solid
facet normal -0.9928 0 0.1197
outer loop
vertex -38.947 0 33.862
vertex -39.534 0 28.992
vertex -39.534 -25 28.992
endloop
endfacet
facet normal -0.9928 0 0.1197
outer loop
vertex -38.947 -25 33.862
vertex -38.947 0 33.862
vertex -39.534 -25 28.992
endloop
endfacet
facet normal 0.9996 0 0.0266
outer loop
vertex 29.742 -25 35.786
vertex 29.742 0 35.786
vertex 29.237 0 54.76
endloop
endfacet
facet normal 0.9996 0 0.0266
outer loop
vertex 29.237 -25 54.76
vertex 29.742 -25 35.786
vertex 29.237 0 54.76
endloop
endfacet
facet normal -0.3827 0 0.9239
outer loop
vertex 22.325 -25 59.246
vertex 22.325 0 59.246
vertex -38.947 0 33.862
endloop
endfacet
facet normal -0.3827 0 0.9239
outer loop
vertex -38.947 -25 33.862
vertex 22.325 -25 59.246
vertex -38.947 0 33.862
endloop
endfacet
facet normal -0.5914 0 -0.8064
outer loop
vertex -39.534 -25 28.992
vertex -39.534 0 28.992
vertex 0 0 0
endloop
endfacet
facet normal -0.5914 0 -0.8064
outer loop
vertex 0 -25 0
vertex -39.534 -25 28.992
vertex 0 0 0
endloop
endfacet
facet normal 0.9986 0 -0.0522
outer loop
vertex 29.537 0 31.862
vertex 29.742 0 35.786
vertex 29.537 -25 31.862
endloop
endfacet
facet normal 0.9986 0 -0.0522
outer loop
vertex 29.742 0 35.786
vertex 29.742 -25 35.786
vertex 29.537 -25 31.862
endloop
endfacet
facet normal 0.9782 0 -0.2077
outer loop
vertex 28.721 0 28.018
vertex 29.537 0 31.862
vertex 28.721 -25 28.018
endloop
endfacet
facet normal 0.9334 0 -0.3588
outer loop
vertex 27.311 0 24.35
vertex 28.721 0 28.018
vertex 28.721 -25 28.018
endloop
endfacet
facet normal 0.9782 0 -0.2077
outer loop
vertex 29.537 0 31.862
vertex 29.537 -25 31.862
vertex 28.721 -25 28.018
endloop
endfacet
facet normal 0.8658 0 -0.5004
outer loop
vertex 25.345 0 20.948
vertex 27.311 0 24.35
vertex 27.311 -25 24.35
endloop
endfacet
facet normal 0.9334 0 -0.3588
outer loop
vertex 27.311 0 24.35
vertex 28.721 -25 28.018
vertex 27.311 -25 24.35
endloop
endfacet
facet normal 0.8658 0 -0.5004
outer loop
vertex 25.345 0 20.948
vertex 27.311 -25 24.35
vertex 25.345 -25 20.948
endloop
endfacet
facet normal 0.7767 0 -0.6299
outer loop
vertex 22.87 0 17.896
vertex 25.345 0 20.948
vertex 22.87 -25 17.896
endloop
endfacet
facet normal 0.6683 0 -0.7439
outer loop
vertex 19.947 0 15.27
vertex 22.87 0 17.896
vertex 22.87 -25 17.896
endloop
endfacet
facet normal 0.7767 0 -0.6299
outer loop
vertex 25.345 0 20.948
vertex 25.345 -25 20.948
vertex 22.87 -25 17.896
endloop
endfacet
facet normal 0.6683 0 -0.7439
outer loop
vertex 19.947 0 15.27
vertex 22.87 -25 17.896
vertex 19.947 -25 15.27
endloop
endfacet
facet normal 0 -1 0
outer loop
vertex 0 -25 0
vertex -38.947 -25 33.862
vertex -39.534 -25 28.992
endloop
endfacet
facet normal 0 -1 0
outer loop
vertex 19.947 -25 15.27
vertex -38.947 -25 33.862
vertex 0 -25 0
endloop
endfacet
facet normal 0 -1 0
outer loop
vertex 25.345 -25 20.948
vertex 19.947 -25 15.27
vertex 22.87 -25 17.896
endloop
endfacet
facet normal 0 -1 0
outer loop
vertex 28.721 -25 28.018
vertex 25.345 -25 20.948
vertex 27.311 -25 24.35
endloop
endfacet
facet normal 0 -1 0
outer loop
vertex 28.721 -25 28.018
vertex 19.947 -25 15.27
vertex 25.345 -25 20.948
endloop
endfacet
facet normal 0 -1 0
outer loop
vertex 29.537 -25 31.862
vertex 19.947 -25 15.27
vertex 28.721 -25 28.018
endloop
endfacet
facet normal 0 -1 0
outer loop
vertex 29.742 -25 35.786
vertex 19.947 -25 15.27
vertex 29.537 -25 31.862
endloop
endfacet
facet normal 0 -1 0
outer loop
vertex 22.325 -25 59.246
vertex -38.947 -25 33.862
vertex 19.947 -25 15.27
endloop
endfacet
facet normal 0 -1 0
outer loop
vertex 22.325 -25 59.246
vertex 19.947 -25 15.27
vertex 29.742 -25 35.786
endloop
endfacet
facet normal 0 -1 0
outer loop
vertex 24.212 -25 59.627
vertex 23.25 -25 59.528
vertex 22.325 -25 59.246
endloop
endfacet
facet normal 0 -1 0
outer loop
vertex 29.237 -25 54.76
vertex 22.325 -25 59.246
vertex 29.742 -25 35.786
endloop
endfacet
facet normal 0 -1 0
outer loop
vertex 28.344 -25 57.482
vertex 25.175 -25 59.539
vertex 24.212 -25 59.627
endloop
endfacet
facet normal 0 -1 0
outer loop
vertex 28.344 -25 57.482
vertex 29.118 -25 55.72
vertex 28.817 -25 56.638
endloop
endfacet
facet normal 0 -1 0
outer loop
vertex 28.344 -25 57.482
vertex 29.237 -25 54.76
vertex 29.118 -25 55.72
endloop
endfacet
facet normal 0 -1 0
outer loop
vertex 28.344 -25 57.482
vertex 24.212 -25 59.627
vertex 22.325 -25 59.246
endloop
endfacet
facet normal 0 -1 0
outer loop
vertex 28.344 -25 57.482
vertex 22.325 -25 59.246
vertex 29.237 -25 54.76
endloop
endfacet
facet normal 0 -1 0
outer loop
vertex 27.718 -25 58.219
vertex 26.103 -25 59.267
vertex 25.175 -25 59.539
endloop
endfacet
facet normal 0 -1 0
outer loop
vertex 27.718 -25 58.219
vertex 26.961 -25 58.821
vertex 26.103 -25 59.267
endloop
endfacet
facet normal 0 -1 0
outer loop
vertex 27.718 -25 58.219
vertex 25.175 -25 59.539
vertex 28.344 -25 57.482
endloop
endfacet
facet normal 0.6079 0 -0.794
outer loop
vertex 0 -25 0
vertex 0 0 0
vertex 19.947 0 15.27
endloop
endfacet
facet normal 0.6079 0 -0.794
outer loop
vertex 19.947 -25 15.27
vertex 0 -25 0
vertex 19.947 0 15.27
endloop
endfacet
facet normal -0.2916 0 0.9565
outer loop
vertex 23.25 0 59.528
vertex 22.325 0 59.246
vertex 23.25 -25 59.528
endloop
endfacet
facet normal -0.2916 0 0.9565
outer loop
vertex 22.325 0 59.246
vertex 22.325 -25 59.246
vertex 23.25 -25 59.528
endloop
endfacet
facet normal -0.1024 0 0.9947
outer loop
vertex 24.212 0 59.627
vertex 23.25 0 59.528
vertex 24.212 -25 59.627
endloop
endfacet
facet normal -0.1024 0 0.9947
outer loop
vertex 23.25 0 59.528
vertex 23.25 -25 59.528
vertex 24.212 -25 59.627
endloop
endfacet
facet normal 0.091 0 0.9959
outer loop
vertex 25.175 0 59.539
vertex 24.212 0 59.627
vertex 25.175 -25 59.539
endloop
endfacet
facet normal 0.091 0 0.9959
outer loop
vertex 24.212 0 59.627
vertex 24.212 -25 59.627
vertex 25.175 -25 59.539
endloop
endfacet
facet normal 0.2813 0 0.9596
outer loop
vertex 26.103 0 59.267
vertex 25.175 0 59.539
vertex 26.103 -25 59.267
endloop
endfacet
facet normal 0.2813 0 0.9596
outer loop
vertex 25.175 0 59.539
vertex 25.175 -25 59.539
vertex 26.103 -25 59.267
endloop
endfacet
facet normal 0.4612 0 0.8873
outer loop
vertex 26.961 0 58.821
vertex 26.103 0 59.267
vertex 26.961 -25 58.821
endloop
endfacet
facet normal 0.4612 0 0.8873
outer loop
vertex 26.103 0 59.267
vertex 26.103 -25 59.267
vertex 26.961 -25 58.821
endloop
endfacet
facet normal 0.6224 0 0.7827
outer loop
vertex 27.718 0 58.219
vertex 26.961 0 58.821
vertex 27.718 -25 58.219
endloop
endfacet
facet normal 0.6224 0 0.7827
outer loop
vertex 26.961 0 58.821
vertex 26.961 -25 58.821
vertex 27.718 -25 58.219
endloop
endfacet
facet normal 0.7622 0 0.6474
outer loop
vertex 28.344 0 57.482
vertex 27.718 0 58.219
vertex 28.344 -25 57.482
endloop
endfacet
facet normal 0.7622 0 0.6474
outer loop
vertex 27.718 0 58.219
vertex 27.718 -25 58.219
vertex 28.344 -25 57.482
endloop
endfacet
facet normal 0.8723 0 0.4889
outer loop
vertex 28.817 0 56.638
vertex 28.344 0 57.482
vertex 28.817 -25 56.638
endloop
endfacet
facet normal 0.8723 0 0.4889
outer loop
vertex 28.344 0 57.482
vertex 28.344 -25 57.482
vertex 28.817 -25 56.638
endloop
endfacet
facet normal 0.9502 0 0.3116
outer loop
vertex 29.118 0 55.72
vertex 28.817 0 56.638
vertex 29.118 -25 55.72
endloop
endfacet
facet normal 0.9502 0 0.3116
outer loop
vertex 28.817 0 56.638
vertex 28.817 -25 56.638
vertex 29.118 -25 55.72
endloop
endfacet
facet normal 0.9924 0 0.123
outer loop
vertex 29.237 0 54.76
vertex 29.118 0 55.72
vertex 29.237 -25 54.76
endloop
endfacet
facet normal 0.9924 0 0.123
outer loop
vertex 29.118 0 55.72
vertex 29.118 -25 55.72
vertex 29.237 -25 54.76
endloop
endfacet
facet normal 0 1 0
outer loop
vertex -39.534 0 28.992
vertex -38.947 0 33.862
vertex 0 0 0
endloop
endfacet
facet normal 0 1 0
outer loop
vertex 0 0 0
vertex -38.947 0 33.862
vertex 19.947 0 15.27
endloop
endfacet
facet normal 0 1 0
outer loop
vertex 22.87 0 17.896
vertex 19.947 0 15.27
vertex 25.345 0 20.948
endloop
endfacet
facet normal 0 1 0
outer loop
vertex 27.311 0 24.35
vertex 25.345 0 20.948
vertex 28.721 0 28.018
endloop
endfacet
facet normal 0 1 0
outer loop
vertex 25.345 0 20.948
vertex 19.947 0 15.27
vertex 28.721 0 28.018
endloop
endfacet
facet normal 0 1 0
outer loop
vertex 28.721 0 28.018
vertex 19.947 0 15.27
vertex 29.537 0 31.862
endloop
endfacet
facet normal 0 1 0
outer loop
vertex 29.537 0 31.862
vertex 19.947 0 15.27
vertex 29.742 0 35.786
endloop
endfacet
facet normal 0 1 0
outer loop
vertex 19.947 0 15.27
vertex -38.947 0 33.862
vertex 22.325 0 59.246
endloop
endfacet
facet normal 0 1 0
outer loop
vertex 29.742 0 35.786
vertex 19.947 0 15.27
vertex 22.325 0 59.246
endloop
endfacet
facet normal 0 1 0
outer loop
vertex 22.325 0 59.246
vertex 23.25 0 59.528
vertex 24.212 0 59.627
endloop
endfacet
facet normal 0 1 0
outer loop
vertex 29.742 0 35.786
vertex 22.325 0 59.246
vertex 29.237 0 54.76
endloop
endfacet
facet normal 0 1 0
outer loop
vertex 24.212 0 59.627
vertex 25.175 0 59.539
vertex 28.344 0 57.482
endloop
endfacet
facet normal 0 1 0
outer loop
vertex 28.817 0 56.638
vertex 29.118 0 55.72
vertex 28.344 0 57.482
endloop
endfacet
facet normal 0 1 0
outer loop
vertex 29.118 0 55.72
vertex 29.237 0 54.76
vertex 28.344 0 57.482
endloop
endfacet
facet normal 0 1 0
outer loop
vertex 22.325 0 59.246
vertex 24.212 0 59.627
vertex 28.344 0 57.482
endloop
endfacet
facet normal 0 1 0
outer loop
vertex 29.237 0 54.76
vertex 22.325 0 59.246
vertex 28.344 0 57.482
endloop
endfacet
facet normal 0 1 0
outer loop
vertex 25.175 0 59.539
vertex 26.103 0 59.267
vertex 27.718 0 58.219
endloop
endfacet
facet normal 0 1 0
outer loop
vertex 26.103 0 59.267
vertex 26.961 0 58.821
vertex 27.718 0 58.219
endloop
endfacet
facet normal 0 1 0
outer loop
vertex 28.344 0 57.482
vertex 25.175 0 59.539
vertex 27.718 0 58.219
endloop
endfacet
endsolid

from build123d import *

# Parameters (mm, degrees)
F1_DEPTH = 25
F2_SIZE  = 5
F3_R     = 5
F4_R     = 25
F5_R     = 7.049752
F6_DEPTH = 25


with BuildPart() as f1:
    # F0 (on Front) → F1 (new body)
    with BuildSketch(Plane.XZ):
        Polygon((0, 0), (30.081257, 23.027755), (29.043972, 62.029697), (-43.566033, 31.94841), align=None)
    extrude(amount=F1_DEPTH)

    # F2
    f2_edges = [f1.edges().sort_by_distance(p)[0] for p in [
        (-43.566033, -12.5, 31.94841),
    ]]
    chamfer(f2_edges, length=F2_SIZE)

    # F3
    f3_edges = [f1.edges().sort_by_distance(p)[0] for p in [
        (29.043972, -12.5, 62.029697),
    ]]
    fillet(f3_edges, radius=F3_R)

    # F4
    f4_edges = [f1.edges().sort_by_distance(p)[0] for p in [
        (30.081257, -12.5, 23.027755),
    ]]
    fillet(f4_edges, radius=F4_R)

    # F5 (on face) → F6 (join)
    with BuildSketch(Plane.XZ.offset(25)):
        with Locations((0, 40.225446)):
            Circle(F5_R)
    extrude(amount=-F6_DEPTH)


solid = f1.part
